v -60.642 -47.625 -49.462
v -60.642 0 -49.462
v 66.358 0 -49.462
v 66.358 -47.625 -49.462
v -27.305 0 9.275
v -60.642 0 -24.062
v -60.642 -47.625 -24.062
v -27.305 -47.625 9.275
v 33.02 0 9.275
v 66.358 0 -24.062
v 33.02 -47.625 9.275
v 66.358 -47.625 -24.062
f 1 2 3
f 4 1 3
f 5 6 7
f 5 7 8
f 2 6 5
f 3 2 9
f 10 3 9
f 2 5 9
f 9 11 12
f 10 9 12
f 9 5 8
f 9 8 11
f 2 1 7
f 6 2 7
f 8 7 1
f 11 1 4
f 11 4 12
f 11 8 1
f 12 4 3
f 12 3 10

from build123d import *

# Parameters (mm, degrees)
F0_W     = 127
F0_H     = 58.7375
F1_DEPTH = 47.625
F3_DEPTH = 47.625


with BuildPart() as f1:
    # F0 (on Front) → F1 (new body)
    with BuildSketch(Plane.XZ):
        with Locations((2.857501, -20.093455)):
            Rectangle(F0_W, F0_H)
    extrude(amount=F1_DEPTH)

    # F2 (on face) → F3 (cut)
    with BuildSketch(Plane.XZ.offset(47.625)):
        Polygon((-60.642499, 9.275295), (-60.642499, -24.062205), (-27.304999, 9.275295), align=None)
        Polygon((33.020001, 9.275295), (66.357501, -24.062205), (66.357501, 9.275295), align=None)
    extrude(amount=-F3_DEPTH, mode=Mode.SUBTRACT)


solid = f1.part
